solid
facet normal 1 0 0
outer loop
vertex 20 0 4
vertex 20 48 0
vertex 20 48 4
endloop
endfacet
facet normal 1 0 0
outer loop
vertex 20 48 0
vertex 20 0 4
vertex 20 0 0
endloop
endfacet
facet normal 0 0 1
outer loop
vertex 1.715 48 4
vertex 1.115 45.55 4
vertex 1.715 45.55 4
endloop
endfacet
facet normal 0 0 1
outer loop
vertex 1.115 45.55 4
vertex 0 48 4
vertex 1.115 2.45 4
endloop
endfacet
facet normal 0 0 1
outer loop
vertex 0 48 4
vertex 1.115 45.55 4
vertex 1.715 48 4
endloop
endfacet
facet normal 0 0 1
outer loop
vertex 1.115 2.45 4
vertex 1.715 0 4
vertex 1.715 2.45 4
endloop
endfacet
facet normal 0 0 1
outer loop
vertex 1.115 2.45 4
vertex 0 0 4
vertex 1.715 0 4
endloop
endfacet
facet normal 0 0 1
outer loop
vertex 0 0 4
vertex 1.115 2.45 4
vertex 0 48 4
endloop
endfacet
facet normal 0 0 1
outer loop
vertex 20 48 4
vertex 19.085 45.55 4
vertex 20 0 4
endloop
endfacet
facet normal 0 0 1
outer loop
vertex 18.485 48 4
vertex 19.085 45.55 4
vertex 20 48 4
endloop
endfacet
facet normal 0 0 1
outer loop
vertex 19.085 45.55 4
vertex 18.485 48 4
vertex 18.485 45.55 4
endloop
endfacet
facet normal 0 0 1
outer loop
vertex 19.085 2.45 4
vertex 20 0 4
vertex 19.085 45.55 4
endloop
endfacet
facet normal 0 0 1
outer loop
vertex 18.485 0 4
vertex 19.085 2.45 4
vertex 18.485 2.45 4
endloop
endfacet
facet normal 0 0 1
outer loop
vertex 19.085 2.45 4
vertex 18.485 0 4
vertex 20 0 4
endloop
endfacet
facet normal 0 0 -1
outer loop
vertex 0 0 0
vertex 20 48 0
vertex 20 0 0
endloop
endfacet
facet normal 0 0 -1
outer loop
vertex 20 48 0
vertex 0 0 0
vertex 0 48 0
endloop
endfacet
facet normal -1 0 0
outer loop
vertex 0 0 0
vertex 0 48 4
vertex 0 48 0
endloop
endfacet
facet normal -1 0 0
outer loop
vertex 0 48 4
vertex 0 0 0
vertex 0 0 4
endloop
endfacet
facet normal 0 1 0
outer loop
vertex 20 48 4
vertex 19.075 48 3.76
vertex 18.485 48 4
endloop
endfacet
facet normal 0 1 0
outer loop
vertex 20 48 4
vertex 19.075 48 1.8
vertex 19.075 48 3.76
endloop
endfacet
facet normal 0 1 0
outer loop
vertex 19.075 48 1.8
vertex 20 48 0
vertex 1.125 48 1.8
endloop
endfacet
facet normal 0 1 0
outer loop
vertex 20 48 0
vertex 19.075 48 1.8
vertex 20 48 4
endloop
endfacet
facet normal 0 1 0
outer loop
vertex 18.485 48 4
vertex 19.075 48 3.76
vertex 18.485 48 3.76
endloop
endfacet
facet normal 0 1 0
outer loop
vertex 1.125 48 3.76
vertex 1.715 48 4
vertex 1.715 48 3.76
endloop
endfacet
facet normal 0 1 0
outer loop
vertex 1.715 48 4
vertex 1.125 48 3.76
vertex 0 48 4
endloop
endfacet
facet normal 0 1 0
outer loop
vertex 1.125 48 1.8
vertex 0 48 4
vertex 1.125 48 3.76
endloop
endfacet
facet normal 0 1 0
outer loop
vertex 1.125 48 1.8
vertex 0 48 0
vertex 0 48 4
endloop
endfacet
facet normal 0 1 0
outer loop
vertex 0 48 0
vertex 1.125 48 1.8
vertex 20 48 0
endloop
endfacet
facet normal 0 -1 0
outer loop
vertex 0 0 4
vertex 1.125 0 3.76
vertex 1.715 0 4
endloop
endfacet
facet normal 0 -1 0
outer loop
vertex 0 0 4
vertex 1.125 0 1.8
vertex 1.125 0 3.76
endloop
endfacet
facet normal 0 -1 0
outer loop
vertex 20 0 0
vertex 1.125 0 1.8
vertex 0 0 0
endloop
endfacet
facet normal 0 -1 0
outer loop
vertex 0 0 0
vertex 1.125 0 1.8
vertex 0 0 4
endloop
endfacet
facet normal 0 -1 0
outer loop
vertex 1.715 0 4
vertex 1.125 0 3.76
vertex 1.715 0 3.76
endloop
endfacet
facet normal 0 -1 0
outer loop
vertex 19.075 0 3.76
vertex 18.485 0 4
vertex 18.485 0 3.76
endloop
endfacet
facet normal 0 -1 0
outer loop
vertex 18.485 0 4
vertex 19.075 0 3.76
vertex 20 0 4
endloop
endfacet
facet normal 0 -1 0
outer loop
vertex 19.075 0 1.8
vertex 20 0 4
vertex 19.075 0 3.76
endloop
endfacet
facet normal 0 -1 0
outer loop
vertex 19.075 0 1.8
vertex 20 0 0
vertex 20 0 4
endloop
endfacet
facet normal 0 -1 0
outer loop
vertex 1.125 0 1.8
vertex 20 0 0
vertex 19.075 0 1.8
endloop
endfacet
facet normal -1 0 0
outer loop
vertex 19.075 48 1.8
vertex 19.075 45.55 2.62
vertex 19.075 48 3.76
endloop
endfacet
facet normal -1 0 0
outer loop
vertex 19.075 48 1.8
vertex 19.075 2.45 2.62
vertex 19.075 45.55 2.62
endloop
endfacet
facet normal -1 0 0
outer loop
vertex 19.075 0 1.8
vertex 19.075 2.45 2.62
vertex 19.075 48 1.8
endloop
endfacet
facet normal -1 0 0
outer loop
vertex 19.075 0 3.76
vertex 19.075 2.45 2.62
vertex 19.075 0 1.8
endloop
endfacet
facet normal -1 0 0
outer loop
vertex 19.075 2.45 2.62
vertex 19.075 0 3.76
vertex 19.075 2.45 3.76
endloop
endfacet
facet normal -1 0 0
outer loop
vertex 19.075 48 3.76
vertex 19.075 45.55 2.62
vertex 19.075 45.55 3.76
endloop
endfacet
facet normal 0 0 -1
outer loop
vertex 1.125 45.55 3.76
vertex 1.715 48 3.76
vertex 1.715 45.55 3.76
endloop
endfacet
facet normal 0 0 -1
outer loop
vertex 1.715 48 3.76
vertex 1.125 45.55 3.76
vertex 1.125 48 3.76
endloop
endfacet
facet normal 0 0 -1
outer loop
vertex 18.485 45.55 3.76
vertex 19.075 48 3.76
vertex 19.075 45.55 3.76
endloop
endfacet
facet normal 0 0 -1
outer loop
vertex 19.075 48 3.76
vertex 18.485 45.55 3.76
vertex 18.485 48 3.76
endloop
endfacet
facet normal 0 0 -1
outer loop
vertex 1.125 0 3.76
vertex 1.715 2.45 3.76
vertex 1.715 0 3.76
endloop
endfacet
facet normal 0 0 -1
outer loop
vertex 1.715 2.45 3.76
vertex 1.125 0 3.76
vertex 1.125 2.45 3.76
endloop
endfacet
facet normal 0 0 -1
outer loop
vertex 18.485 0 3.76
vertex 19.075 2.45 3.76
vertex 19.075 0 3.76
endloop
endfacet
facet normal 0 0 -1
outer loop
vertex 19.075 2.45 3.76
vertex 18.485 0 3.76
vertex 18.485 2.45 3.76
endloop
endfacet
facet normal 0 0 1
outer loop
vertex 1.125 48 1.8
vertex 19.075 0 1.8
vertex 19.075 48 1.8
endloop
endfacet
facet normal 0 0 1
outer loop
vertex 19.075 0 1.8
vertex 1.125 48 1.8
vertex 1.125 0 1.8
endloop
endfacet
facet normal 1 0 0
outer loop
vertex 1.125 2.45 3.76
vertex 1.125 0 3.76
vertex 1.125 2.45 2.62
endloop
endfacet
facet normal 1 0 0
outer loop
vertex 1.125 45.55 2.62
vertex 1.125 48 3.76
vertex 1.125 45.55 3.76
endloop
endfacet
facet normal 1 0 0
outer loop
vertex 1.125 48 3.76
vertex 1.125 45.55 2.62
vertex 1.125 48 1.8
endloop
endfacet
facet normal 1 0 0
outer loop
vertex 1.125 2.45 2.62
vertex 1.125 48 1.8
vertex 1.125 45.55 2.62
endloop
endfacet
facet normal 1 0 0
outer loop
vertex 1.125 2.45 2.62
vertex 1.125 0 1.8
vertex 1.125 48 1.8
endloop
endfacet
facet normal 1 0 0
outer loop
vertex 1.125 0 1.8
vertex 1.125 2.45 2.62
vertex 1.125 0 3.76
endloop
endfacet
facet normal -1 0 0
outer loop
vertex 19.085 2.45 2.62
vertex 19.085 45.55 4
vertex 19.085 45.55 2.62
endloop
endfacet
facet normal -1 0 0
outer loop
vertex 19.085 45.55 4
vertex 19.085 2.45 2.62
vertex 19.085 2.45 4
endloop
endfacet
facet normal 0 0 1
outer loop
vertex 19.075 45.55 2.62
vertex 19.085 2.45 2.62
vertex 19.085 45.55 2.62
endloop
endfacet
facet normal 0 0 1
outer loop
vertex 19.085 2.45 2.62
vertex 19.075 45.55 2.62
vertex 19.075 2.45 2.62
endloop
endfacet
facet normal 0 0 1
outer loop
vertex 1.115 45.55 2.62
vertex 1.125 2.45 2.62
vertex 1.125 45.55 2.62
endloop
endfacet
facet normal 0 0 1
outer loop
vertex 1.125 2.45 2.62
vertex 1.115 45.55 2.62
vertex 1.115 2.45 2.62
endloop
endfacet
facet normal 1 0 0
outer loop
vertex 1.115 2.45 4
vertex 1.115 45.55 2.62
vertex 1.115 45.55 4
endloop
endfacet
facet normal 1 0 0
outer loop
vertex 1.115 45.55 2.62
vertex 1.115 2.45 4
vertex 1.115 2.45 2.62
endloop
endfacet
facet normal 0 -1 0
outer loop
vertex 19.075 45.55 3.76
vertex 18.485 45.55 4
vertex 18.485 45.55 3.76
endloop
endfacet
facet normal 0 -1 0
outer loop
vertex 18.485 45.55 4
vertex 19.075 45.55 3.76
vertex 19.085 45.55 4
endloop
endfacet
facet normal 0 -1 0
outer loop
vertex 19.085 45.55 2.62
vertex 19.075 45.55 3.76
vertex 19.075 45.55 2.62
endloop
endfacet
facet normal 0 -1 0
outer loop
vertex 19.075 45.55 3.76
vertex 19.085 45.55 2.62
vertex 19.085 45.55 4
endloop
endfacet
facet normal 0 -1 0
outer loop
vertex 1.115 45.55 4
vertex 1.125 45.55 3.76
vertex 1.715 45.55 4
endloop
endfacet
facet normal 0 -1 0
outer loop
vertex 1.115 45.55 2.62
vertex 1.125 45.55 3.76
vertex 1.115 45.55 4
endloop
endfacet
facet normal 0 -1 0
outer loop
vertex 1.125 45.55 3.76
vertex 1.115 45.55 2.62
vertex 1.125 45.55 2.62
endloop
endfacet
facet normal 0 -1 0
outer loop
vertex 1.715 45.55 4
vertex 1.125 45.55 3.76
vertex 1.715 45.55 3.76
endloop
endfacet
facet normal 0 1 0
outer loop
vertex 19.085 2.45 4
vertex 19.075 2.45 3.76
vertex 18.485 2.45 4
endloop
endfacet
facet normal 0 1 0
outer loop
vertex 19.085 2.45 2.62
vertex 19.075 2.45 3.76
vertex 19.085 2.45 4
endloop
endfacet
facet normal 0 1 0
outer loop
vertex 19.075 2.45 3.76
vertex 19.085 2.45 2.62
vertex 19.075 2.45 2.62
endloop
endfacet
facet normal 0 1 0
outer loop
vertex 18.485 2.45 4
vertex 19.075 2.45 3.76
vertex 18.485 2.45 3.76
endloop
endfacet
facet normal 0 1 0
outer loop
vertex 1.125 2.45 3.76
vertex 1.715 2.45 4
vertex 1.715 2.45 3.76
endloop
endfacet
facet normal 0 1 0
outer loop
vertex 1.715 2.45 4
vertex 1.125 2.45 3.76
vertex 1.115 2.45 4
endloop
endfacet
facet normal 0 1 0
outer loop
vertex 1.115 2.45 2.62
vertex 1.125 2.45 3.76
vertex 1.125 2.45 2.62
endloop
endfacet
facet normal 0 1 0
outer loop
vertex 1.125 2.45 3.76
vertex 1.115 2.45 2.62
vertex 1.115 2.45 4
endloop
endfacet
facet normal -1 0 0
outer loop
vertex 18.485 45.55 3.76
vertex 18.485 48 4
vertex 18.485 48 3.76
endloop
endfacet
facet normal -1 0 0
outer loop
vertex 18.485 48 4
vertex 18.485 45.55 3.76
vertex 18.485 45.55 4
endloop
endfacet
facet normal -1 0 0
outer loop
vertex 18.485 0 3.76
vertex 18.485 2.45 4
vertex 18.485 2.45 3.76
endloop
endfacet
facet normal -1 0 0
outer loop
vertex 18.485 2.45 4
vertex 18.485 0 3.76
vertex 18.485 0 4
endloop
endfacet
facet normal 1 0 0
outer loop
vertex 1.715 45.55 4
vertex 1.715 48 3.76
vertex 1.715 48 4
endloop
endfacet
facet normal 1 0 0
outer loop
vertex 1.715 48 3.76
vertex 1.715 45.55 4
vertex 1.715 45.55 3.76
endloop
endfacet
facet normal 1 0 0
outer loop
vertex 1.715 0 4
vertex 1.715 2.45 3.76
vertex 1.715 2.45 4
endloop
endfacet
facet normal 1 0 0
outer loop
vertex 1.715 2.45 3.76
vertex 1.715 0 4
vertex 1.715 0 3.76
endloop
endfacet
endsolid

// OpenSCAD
// Bracket dimensions
bracket_width  = 20;  // mm
bracket_length = 48;  // mm
bracket_height = 4;   // mm

// Object dimensions (the recess cutout)
// For example: 18mm wide, 20mm long, 1.5mm tall
extend_margin = 1;
object_width  = 17.75;   // mm
object_length = 48.27;   // mm
object_length_start = (bracket_length - object_length) / 2;   // mm

object_height = 1.76;  // mm
object_allowance = 0.1;
object_height_allowance = object_height + (object_allowance * 2);

object_width_allowance = object_width + (object_allowance * 2);
object_width_start = (bracket_width - object_width) / 2; 

// Pin cutout
pin_width = 17.77;
pin_length = 43.1;
pin_height = 12;
pin_width_start = (bracket_width - pin_width) / 2; 
pin_length_start = (bracket_length - pin_length) / 2;   // mm
pin_width_allowance = pin_width + (object_allowance * 2);

clamp_width = 0.6;
clamp_width_start = pin_width_start + clamp_width; 
clamp_width_gap = pin_width_allowance - (clamp_width * 2);


difference() {
    // Base bracket: 20mm (width) x 20mm (length) x 4mm (height)
    cube([bracket_width,bracket_length,bracket_height]);
    
    // Cutout: 18mm (width) x 20mm (length) x 1.5mm (depth)
    // It’s centered in the x-direction (leaving a 1mm margin on each side)
    // and positioned so that the recess is on the top surface (starting at 4-1.5 = 2.5mm high)
    
    // The allowance for the board
    translate([object_width_start, object_length_start-extend_margin, 1.8])
        cube([object_width_allowance, object_length + extend_margin, object_height_allowance]);
    
   // Allowance for Pins
   translate([pin_width_start, pin_length_start, 2.62])
        cube([pin_width_allowance, pin_length, pin_height]);
    
   // Break through the middle
   translate([clamp_width_start, object_length_start-extend_margin, 2.62])
        cube([clamp_width_gap, object_length + extend_margin, pin_height]);
}
